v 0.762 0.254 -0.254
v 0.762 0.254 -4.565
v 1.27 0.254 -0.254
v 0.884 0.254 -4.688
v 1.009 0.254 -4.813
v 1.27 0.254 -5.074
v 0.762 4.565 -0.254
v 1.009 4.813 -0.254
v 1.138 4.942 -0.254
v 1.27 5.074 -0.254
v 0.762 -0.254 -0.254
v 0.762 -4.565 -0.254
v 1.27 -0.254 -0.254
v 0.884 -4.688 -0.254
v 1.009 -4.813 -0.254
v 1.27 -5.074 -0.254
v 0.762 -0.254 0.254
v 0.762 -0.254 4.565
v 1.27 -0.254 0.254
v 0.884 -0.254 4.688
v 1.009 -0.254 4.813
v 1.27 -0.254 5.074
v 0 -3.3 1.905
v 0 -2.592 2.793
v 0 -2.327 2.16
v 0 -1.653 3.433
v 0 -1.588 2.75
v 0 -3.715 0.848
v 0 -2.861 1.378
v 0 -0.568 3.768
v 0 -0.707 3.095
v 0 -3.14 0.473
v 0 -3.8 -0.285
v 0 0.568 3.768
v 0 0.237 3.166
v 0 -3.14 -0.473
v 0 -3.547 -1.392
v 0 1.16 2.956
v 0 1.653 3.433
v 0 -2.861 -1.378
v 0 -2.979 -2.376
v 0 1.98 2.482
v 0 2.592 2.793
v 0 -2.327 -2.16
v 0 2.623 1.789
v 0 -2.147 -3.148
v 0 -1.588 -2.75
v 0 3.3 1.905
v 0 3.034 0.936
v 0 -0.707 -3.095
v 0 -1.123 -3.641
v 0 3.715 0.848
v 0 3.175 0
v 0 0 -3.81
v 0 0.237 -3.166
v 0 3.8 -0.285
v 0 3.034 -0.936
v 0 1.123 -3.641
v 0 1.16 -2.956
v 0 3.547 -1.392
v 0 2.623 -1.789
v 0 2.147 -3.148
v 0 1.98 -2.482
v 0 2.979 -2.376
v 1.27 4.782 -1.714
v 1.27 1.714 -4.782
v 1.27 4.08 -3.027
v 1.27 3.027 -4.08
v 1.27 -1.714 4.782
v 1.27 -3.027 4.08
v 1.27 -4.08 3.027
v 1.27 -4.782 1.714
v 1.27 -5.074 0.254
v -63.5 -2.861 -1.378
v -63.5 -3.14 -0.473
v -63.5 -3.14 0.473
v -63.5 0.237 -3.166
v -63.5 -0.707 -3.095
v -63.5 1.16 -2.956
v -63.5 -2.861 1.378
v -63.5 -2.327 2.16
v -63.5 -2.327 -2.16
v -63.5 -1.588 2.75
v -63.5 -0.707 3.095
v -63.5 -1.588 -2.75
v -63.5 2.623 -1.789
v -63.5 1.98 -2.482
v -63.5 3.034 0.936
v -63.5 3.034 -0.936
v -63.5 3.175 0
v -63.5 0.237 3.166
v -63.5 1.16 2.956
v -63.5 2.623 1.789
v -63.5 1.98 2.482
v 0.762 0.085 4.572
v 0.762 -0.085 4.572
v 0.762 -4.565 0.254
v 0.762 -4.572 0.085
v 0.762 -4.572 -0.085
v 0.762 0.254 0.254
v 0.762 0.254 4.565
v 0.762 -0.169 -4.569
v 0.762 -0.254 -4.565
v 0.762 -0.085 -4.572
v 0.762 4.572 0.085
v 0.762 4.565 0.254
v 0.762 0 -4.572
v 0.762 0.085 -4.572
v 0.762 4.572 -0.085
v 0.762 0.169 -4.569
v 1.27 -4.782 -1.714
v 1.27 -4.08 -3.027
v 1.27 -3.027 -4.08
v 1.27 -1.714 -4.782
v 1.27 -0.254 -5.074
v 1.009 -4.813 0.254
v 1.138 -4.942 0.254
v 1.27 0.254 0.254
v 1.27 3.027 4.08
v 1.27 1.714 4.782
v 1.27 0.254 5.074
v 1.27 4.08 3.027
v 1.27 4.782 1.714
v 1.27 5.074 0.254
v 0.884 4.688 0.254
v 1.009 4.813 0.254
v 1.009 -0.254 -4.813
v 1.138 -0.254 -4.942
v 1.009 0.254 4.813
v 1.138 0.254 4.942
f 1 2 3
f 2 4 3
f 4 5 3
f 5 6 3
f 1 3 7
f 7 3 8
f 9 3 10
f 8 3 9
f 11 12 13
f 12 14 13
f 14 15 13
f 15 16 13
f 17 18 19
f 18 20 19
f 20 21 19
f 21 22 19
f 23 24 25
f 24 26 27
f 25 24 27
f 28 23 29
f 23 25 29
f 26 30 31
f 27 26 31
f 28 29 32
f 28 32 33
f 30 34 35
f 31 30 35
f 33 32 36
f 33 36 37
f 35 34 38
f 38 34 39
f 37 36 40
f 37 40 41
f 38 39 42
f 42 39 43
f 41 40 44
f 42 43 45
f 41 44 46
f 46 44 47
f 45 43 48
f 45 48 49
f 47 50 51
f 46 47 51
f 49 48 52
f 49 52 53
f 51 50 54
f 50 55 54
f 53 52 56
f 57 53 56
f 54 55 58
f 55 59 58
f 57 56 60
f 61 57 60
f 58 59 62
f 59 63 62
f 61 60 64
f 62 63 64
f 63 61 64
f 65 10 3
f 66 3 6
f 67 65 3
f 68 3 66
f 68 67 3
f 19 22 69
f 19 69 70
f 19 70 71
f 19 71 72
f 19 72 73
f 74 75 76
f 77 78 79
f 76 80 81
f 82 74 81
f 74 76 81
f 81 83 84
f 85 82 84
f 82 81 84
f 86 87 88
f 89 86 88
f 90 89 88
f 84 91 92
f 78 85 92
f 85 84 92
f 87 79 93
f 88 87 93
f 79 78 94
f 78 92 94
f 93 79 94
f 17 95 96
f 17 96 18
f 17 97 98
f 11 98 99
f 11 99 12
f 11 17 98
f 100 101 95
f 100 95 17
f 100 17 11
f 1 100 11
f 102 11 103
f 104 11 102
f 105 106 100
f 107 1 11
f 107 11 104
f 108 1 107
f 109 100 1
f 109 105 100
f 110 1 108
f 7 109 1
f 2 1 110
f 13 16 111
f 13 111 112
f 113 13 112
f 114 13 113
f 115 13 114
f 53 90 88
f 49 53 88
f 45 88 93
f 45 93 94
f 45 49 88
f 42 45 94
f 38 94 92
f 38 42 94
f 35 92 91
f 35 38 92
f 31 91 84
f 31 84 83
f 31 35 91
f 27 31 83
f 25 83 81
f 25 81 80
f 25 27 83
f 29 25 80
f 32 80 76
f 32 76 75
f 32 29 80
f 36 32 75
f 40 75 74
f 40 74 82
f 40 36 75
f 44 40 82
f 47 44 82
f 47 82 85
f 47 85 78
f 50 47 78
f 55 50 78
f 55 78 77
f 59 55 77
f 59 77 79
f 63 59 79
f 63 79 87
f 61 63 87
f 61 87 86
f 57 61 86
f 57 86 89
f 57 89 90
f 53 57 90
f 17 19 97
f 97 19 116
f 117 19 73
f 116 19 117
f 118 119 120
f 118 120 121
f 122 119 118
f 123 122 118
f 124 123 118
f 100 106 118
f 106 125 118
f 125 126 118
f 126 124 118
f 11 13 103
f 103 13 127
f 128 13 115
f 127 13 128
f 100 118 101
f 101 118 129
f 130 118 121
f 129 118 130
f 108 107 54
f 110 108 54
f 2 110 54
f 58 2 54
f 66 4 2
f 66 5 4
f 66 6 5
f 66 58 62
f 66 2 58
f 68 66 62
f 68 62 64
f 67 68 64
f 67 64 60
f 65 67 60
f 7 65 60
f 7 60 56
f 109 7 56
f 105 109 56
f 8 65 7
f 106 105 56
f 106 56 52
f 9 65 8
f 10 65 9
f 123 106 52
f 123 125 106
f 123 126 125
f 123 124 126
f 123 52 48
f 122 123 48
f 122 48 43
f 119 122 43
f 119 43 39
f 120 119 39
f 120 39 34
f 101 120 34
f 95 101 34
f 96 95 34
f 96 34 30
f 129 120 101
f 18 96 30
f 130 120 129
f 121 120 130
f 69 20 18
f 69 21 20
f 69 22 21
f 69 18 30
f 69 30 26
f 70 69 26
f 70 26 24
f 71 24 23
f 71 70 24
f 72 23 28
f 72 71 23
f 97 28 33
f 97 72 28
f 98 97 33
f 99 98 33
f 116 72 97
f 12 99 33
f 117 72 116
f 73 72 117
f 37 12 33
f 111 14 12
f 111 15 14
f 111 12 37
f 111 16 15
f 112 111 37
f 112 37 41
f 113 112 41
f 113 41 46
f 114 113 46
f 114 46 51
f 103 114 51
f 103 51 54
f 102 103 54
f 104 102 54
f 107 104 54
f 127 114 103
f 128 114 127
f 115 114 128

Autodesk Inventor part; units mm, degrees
ref_plane "YZ Plane" through (0, 0, 0) normal (1, 0, 0) x (0, 1, 0)
ref_plane "XZ Plane" through (0, 0, 0) normal (0, 1, 0) x (-1, 0, 0)
ref_plane "XY Plane" through (0, 0, 0) normal (0, 0, 1) x (1, 0, 0)
sketch "Sketch1" plane through (0, 0, 0) normal (1, 0, 0) x (0, 1, 0)
  circle A0 centre (0, 0) radius 3.175
  dimension "d0" = 6.35
extrude "Extrusion1" add sketch "Sketch1" against normal blind 63.5
sketch "Sketch2" plane through (0, 0, 0) normal (1, 0, 0) x (0, 0, -1)
  circle A0 centre (0, 0) radius 3.175 projected
  circle A1 centre (0, 0) radius 5.08
  dimension "d3" = 10.16
extrude "Extrusion2" add sketch "Sketch2" along normal blind 1.27 contours A0 | A1
chamfer "Chamfer1" distance 1.27 angle 45 1 edges at (0, 0, 5.08)
sketch "Sketch3" plane through (1.27, 0, 0) normal (1, 0, 0) x (0, 0, -1)
  line L0 (-0.254, -5.08) -> (0.254, -5.08)
  line L1 (0.254, -5.08) -> (0.254, 5.08)
  line L2 (0.254, 5.08) -> (-0.254, 5.08)
  line L3 (-0.254, 5.08) -> (-0.254, -5.08)
  line L4 (-0.254, -5.08) -> (0.254, 5.08) construction
  line L5 (0.254, -5.08) -> (-0.254, 5.08) construction
  line L6 (-5.08, -0.254) -> (5.08, -0.254)
  line L7 (5.08, -0.254) -> (5.08, 0.254)
  line L8 (5.08, 0.254) -> (-5.08, 0.254)
  line L9 (-5.08, 0.254) -> (-5.08, -0.254)
  line L10 (-5.08, -0.254) -> (5.08, 0.254) construction
  line L11 (5.08, -0.254) -> (-5.08, 0.254) construction
  point P0 (0, 0)
  dimension "d9" = 0.508
  dimension "d10" = 10.16
  dimension "d11" = 10.16
  dimension "d12" = 0.508
extrude "Extrusion3" cut sketch "Sketch3" against normal blind 0.508
thread "Thread1" size "1/4-20 UNC" class "2A" standard "ANSI Unified Screw Threads" full length
properties part number "screws (for assembly)"
